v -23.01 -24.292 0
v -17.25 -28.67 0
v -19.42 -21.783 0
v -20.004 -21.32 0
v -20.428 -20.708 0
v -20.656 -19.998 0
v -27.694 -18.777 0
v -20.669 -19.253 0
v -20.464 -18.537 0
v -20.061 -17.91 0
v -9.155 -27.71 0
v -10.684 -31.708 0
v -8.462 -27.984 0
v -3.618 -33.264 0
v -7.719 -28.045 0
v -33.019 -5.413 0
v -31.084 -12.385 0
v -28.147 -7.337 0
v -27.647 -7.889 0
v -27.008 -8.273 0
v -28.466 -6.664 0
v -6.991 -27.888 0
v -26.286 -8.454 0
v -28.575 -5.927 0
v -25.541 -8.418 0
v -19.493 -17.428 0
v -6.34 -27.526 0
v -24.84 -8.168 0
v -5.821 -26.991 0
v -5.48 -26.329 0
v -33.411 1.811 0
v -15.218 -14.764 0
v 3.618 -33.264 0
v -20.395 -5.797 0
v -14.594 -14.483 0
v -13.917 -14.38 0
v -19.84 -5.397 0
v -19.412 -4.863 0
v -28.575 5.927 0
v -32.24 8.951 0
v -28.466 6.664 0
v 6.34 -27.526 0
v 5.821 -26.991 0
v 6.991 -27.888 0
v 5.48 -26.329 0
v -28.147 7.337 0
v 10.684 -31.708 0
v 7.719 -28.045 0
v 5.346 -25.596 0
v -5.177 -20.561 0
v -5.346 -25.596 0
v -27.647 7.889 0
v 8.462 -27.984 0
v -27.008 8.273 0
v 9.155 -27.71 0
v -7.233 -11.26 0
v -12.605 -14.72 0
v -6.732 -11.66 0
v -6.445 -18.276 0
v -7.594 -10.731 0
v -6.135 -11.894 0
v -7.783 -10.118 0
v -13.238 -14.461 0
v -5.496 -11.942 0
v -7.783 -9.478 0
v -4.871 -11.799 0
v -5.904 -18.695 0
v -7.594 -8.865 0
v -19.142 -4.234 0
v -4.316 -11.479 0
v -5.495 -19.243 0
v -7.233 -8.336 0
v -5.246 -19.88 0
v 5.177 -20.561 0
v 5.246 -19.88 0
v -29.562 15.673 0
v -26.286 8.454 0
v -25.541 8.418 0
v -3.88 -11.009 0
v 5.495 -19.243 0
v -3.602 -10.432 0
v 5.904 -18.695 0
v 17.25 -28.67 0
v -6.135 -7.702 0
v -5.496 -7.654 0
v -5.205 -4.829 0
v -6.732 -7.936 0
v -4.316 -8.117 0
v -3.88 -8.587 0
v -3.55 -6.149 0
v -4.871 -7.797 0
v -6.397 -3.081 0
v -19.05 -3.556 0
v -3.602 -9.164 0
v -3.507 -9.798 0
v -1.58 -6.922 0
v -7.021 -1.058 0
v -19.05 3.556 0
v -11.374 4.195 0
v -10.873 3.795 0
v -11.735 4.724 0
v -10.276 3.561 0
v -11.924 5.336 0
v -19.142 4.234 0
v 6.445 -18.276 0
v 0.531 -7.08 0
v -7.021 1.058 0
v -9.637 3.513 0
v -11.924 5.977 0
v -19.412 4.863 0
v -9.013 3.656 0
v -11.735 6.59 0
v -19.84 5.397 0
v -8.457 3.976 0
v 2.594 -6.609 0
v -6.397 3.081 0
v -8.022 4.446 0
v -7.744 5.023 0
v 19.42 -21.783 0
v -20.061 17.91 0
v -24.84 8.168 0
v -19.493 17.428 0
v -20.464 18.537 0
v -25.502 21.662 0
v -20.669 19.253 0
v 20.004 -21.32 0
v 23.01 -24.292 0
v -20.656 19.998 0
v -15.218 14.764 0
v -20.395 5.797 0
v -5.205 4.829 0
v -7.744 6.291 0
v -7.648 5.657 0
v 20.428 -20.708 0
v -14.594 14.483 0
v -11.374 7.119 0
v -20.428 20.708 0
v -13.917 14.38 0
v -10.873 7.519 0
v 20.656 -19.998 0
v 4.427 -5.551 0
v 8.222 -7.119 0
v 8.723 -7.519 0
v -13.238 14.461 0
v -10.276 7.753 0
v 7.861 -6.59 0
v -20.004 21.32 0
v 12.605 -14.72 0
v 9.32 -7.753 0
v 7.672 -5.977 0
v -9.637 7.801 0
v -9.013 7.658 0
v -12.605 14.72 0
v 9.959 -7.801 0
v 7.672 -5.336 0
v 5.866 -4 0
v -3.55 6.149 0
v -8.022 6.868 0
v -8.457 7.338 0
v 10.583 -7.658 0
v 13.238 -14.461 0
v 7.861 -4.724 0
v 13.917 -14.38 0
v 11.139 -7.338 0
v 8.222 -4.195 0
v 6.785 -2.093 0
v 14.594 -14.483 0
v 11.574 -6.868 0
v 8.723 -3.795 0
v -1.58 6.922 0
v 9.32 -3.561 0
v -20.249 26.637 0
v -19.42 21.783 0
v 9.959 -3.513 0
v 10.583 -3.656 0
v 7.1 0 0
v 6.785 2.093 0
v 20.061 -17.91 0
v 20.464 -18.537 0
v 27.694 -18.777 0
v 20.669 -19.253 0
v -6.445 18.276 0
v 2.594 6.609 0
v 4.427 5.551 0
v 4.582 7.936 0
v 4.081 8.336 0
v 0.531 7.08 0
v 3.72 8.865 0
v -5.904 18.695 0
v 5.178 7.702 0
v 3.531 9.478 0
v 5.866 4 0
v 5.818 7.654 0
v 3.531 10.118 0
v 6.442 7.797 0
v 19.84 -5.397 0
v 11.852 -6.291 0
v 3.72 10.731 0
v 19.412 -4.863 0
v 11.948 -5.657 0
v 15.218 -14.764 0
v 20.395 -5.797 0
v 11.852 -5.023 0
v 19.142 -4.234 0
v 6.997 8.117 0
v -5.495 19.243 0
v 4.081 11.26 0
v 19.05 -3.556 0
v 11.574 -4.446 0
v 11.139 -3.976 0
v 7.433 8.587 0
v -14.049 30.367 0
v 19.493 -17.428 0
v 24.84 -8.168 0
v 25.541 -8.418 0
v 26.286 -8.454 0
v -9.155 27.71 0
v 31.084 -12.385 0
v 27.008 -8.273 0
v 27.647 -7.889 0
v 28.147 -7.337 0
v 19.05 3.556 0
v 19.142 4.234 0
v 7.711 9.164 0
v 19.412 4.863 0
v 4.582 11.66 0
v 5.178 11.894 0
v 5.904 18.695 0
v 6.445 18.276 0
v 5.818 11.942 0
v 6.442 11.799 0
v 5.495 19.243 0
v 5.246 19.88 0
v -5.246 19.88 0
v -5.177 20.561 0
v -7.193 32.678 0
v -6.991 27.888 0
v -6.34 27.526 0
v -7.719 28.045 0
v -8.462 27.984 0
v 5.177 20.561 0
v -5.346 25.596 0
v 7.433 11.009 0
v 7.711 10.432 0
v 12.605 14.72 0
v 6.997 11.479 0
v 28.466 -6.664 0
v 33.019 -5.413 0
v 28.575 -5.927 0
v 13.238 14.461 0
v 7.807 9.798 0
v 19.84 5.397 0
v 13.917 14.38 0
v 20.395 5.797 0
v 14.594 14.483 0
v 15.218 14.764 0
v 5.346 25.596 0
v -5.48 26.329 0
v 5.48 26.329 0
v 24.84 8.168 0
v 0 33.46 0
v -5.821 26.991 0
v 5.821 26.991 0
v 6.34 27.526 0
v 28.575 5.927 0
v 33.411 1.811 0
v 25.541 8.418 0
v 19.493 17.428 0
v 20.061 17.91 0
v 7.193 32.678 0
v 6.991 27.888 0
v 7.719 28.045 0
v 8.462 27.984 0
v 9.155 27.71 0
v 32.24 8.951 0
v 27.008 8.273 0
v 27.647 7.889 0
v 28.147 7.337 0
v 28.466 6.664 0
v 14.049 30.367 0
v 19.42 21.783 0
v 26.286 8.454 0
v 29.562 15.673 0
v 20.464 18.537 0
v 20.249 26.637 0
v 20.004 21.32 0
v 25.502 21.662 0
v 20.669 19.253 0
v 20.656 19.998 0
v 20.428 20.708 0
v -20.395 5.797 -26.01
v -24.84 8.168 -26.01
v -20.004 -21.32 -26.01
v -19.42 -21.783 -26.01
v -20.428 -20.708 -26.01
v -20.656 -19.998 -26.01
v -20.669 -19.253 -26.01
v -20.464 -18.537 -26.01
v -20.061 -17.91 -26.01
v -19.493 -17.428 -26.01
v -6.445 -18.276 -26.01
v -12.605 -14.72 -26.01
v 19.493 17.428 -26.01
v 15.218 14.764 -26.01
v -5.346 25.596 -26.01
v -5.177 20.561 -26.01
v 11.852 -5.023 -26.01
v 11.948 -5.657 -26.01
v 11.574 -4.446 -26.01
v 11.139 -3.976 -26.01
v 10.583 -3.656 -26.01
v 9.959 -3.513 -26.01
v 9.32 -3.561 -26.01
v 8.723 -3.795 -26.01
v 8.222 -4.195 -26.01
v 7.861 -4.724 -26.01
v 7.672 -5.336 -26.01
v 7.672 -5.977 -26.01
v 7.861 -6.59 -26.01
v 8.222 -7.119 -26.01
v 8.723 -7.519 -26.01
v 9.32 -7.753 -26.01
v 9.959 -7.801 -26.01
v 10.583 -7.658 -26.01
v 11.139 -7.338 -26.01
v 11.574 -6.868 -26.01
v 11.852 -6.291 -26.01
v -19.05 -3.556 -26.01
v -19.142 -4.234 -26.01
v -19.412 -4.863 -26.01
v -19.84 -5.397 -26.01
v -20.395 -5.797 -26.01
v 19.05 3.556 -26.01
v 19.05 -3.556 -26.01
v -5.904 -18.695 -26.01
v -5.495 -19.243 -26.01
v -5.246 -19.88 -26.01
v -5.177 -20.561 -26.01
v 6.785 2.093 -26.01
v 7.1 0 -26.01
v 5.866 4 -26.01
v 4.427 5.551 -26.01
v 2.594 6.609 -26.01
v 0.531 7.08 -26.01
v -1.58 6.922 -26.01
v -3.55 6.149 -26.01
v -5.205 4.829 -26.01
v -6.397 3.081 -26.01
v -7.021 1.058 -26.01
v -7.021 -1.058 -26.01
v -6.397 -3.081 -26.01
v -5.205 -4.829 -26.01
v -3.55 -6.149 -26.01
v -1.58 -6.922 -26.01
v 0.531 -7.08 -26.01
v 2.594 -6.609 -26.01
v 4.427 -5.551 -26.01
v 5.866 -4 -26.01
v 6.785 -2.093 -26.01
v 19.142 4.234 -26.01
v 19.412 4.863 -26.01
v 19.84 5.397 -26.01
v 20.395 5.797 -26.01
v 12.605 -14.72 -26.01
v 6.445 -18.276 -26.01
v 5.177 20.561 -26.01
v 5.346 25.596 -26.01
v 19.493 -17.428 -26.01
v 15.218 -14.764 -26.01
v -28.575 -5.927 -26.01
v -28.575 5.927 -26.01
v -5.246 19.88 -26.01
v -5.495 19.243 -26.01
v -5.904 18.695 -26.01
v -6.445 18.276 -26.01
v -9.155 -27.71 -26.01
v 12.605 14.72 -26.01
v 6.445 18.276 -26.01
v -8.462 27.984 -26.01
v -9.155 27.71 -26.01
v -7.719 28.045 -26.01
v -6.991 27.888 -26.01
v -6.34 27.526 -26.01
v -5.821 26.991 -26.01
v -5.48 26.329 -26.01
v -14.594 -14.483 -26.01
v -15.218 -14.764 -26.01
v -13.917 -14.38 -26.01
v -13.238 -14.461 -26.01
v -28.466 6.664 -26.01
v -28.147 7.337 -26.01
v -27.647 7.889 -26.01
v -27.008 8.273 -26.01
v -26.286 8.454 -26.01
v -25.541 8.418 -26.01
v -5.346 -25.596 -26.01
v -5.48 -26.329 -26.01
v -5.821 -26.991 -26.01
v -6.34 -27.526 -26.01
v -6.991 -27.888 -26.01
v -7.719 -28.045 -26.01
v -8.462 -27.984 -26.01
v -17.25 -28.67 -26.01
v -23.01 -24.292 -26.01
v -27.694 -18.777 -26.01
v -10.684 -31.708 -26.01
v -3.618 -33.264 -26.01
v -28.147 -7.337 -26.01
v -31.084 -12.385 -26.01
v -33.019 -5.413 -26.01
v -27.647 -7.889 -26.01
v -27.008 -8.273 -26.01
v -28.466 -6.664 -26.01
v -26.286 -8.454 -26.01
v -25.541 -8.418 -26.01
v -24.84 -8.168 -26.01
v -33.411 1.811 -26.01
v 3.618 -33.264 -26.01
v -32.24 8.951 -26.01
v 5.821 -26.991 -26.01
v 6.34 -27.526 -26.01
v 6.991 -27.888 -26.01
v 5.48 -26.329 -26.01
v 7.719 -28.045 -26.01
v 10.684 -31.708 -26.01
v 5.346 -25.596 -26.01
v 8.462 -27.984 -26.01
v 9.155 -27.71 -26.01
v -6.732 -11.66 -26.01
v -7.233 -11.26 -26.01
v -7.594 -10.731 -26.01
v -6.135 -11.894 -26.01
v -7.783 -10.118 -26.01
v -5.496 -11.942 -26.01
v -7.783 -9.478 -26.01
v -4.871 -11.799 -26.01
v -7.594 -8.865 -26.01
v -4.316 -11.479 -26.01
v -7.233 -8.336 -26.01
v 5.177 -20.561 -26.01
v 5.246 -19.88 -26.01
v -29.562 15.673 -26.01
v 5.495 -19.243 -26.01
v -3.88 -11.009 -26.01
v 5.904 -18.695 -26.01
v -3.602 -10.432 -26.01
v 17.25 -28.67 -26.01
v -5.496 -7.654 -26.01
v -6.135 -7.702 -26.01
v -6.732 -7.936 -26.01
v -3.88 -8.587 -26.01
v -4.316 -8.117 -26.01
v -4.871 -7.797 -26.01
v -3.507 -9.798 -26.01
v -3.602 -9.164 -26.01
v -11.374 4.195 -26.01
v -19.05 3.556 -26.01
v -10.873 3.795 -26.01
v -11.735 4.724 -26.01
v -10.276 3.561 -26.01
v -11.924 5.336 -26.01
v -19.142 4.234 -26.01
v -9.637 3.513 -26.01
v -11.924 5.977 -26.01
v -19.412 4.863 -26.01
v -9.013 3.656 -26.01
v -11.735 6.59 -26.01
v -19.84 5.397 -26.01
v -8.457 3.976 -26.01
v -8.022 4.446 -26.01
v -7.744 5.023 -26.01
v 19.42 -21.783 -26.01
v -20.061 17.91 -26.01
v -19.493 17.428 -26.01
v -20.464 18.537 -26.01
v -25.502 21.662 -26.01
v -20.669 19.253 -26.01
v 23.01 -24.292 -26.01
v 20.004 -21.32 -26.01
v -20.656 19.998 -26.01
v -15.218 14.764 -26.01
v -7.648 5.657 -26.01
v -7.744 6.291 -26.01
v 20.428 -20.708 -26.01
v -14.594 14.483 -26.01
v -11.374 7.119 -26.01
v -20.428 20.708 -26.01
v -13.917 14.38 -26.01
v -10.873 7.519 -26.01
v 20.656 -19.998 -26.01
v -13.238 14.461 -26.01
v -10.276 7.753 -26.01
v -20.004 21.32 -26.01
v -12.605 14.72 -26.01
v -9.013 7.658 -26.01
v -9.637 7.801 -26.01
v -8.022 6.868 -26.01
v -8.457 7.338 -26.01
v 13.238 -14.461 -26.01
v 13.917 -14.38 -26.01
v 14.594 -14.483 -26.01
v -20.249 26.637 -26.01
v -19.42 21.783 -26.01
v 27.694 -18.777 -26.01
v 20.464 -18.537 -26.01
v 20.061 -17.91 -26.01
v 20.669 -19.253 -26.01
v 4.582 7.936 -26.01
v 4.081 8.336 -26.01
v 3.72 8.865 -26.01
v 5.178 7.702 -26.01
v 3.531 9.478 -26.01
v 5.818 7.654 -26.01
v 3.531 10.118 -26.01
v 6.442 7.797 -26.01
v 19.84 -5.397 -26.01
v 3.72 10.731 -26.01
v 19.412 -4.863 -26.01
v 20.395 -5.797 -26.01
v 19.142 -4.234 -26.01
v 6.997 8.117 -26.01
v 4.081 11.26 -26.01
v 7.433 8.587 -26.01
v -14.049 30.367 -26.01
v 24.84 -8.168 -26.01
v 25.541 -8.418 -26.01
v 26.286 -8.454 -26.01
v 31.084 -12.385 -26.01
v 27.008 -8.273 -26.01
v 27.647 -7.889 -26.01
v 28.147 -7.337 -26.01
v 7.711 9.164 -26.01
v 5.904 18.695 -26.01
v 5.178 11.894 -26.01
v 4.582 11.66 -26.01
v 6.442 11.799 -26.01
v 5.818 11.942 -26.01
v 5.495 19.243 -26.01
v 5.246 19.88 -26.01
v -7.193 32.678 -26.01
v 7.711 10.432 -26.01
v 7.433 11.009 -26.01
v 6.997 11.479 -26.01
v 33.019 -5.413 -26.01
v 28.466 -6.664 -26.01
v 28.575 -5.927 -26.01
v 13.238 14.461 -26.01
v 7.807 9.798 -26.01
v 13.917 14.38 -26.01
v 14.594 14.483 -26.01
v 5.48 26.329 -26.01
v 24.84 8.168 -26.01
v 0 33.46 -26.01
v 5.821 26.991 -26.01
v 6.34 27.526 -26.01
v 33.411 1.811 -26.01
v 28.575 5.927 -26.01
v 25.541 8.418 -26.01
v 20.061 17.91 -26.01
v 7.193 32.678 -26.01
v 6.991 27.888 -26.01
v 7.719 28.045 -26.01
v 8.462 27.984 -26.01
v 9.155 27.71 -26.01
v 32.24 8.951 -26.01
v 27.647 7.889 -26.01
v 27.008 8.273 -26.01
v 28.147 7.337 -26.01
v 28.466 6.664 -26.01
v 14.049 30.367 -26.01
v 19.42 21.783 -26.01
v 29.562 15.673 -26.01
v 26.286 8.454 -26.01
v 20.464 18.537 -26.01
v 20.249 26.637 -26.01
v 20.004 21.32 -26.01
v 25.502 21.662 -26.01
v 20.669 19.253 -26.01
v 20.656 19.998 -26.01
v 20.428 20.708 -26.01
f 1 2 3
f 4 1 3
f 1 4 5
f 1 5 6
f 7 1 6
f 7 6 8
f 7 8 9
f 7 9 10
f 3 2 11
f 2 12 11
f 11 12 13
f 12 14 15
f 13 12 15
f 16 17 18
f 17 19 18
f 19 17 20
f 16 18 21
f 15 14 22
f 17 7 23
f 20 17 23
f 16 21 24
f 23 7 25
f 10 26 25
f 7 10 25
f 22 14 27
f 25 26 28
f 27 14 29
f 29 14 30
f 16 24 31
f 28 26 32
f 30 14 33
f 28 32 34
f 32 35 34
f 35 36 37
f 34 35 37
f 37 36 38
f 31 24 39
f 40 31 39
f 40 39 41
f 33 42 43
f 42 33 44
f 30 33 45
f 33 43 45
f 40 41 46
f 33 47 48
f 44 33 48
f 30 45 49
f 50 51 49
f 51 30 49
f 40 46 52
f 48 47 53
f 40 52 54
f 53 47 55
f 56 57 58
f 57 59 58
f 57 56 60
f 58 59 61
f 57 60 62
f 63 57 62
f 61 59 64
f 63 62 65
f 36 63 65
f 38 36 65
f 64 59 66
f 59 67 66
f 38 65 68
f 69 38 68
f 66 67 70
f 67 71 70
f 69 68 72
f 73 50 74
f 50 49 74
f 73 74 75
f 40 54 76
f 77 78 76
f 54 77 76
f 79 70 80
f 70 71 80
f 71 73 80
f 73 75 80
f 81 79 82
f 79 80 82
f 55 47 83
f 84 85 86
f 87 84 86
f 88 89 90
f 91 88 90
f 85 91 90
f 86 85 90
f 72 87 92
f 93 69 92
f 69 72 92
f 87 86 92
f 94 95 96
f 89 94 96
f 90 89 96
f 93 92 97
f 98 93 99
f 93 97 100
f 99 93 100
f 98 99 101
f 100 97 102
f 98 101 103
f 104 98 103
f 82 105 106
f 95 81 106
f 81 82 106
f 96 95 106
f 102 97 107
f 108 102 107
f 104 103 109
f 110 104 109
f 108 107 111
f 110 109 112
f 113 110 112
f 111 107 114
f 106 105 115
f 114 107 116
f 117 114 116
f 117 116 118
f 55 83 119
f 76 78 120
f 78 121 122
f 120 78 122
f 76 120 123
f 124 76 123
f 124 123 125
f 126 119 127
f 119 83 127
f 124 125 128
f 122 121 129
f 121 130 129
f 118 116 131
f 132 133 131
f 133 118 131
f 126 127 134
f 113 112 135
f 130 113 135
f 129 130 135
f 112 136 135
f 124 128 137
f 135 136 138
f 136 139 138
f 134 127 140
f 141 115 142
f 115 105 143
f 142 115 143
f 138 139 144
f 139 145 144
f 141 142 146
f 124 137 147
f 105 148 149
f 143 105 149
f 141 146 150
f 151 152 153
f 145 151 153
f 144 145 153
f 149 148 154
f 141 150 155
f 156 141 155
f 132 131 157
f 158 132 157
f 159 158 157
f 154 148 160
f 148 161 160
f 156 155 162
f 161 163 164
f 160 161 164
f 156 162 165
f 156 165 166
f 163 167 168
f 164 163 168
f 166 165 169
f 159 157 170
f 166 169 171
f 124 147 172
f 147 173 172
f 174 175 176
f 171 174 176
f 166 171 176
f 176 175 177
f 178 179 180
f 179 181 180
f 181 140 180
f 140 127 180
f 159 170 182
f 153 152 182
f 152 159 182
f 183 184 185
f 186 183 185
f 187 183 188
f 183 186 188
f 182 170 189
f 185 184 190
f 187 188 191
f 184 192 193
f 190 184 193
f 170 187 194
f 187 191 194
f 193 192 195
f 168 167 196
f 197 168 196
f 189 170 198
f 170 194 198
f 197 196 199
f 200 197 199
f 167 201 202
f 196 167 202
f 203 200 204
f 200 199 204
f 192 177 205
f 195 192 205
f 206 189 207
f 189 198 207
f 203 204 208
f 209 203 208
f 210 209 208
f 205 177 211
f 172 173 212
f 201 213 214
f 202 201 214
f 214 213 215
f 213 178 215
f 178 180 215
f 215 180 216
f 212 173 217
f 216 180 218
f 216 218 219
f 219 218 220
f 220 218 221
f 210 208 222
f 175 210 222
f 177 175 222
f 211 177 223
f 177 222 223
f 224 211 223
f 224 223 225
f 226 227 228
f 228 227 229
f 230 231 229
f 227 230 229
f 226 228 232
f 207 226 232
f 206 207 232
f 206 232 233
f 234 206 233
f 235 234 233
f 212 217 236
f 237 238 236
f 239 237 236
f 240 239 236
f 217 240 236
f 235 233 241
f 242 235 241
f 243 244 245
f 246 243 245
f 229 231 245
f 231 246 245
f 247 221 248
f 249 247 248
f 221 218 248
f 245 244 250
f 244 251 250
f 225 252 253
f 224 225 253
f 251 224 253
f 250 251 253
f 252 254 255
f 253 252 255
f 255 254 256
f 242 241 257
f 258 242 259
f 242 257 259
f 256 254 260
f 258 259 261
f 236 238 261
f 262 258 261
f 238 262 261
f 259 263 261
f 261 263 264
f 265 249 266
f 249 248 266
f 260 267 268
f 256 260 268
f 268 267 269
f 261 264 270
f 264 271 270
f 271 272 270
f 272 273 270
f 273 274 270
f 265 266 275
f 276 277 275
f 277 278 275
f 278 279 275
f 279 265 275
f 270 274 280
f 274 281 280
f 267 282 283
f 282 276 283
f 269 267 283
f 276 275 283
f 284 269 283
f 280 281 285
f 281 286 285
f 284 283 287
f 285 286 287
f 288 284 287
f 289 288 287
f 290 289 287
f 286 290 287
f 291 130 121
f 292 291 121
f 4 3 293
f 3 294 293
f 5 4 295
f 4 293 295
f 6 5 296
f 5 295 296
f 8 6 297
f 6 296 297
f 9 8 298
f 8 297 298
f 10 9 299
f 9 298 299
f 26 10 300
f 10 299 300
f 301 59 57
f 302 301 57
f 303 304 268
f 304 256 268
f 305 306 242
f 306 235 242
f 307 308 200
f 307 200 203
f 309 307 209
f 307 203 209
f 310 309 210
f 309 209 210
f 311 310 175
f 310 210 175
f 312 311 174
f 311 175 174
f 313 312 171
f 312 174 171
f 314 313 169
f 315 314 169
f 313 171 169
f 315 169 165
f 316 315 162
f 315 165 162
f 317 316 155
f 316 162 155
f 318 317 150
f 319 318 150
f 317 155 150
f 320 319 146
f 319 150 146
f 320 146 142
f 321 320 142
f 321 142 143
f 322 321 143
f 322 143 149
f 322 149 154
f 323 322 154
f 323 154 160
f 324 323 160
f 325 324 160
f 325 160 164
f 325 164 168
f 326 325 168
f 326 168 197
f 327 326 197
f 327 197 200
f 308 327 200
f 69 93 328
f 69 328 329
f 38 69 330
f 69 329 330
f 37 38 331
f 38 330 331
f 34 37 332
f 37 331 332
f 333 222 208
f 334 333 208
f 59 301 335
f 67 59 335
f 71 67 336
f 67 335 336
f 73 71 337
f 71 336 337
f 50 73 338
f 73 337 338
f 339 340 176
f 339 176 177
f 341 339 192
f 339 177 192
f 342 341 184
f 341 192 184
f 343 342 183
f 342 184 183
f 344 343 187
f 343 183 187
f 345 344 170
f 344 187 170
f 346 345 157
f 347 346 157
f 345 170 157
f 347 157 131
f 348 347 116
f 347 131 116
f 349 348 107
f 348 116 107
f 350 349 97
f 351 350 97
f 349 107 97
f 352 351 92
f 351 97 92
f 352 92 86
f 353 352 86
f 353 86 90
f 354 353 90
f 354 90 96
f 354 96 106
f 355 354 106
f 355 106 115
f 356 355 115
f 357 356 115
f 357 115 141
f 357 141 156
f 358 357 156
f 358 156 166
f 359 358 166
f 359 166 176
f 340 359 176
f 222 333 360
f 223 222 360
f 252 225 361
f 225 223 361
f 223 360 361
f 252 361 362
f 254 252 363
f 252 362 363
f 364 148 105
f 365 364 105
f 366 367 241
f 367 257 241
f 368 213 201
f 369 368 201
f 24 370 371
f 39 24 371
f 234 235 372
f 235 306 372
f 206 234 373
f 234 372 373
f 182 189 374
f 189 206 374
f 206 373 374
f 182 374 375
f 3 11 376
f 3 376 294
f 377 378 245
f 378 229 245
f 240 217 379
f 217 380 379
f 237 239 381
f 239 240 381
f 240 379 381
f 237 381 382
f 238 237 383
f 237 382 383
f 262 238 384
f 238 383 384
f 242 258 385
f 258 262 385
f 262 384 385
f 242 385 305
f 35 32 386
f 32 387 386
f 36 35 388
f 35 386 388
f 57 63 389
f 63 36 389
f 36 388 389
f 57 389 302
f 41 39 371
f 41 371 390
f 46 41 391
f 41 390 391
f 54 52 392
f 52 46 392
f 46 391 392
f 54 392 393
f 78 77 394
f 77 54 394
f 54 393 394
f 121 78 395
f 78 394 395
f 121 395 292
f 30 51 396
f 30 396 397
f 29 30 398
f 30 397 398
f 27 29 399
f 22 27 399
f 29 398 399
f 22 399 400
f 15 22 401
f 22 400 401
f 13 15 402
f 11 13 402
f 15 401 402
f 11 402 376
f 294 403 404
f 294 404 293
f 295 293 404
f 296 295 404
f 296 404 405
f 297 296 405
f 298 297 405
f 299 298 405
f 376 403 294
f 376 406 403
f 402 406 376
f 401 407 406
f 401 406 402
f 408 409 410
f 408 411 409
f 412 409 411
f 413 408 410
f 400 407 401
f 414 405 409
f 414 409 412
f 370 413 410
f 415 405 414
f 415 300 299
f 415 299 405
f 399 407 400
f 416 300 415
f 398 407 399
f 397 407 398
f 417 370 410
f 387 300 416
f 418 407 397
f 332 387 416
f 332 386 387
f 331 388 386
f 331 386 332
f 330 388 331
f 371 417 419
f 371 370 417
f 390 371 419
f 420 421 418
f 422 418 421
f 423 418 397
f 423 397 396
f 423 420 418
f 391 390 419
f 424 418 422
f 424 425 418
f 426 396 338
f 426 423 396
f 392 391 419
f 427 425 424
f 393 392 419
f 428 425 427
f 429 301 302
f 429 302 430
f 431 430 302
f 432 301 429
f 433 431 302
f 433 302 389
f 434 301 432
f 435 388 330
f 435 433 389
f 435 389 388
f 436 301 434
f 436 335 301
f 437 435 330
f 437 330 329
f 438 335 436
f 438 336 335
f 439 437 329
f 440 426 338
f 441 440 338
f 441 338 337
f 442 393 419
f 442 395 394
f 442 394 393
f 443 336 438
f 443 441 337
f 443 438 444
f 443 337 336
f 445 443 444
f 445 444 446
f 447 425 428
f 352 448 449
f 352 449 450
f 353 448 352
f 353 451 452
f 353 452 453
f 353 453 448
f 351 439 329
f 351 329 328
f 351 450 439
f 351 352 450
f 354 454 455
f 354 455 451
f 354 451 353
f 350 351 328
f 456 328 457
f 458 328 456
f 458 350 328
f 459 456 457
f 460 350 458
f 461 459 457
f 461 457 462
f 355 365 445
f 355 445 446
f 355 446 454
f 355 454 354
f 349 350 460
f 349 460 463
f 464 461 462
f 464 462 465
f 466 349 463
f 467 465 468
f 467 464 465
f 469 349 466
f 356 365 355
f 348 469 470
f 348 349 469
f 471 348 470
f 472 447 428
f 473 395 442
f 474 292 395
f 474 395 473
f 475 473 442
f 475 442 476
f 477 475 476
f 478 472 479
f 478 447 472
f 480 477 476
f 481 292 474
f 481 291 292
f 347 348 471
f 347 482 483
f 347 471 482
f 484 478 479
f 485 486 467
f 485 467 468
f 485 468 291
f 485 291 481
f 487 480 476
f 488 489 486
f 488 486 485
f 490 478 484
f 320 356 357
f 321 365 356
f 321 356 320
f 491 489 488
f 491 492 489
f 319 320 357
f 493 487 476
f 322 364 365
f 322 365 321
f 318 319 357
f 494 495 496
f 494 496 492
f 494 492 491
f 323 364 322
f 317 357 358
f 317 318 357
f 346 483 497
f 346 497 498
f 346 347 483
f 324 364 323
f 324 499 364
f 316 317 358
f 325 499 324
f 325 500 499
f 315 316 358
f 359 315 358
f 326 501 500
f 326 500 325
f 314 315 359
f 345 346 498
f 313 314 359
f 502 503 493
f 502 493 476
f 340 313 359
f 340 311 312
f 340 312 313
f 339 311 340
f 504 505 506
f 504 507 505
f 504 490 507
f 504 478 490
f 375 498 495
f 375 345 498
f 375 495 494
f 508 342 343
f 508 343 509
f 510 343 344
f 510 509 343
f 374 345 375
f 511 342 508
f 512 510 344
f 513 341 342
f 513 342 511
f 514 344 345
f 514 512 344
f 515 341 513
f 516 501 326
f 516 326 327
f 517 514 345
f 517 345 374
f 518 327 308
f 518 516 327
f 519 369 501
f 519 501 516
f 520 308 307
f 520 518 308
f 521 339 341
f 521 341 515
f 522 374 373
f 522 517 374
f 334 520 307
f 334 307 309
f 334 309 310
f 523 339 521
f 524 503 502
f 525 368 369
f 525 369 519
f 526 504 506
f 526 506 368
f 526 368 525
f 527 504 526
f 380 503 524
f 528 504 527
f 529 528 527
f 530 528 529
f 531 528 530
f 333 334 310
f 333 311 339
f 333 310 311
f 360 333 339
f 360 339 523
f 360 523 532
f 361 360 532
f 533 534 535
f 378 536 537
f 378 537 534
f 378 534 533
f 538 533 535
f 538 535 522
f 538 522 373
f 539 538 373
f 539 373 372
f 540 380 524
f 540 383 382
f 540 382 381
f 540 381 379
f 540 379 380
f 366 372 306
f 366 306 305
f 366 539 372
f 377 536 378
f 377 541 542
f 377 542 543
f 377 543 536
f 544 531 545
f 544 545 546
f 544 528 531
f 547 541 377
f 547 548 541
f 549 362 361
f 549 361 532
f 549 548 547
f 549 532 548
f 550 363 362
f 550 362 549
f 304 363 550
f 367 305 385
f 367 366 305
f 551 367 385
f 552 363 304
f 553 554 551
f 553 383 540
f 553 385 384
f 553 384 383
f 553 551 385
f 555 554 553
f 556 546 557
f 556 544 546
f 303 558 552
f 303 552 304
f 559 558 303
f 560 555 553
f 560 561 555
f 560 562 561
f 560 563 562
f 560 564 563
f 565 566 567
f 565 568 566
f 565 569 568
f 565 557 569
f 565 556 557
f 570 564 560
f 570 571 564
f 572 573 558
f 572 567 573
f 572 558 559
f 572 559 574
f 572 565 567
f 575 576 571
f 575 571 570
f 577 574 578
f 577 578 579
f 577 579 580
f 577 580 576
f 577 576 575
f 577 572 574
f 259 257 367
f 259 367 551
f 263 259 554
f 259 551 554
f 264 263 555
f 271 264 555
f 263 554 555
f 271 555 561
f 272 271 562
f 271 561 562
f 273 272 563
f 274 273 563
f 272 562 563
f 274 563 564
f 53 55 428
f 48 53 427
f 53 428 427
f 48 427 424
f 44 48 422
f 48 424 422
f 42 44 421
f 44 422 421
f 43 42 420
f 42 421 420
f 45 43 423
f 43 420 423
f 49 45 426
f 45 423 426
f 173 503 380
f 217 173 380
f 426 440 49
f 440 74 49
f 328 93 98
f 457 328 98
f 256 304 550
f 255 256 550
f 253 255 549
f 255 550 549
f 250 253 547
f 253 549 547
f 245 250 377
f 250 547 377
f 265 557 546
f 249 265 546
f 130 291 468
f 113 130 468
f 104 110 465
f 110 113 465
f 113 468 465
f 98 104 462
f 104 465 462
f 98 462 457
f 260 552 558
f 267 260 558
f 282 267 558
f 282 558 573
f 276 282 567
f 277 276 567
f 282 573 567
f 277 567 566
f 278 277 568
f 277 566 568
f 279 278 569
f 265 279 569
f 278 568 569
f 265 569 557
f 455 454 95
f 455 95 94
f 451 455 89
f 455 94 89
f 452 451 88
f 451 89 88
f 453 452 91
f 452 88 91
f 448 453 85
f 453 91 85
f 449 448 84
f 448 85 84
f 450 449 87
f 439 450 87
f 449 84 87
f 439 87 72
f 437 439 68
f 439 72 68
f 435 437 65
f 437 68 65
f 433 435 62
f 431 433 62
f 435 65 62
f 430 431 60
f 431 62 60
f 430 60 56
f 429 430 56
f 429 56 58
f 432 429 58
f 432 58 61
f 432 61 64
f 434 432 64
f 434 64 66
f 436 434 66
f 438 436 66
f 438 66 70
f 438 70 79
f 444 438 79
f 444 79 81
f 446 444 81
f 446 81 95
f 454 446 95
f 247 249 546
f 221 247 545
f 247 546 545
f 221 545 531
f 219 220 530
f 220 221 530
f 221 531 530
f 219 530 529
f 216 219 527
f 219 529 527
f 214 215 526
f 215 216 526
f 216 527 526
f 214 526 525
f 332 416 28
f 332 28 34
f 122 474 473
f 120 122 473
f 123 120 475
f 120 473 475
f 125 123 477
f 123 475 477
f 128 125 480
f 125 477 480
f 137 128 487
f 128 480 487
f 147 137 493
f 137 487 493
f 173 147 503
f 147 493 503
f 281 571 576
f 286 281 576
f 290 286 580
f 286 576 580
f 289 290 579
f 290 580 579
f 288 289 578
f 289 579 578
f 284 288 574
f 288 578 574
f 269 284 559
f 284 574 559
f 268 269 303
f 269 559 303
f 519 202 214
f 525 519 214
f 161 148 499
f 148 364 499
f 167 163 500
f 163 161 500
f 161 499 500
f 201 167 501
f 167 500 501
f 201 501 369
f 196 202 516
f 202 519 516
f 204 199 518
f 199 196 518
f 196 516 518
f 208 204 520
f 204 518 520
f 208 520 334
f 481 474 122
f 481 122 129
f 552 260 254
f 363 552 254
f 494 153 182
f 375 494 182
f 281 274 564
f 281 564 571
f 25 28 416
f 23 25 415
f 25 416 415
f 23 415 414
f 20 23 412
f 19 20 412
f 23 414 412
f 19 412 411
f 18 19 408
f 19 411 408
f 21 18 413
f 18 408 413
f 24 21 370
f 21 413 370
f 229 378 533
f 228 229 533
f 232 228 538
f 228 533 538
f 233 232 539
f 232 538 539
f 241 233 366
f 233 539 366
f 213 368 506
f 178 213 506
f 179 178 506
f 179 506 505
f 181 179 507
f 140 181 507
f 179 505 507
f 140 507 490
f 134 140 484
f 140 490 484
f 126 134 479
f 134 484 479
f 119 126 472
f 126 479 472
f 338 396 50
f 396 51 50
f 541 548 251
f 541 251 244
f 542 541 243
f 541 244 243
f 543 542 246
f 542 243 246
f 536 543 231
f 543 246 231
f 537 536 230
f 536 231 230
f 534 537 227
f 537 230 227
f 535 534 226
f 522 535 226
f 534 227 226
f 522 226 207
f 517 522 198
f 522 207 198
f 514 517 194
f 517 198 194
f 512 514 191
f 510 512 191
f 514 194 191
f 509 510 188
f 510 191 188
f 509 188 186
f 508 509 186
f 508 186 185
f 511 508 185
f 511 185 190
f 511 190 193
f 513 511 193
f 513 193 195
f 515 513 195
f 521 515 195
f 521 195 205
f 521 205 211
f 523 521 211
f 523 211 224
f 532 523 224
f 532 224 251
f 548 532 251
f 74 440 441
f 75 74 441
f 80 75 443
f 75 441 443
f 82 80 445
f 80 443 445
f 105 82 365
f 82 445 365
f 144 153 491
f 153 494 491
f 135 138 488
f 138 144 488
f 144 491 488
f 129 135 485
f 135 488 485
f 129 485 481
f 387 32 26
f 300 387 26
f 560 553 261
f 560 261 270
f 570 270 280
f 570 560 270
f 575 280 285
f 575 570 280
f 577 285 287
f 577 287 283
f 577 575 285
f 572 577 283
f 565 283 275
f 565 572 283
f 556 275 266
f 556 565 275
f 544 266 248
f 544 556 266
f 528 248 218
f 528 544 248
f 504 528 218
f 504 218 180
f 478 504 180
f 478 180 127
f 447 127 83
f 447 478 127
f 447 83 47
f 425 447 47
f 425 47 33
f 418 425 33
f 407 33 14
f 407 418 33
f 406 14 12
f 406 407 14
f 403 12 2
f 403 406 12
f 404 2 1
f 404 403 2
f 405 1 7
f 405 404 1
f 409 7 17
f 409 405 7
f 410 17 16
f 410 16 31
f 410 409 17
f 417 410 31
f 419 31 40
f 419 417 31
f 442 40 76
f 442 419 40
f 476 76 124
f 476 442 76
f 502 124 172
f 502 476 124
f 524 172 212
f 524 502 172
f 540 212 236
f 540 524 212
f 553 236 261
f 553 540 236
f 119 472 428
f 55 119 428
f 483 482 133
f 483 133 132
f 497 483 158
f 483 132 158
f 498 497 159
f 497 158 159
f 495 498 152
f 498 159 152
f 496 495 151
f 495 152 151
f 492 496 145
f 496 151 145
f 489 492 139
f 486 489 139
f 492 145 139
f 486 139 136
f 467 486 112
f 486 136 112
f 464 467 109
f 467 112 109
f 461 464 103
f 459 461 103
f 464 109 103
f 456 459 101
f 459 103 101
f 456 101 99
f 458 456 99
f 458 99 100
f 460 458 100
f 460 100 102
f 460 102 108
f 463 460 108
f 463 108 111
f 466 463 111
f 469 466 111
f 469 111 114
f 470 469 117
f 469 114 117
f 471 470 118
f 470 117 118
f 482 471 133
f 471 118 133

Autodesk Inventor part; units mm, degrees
ref_plane "YZ Plane" through (0, 0, 0) normal (1, 0, 0) x (0, 1, 0)
ref_plane "XZ Plane" through (0, 0, 0) normal (0, 1, 0) x (-1, 0, 0)
ref_plane "XY Plane" through (0, 0, 0) normal (0, 0, 1) x (1, 0, 0)
sketch "Sketch4" plane through (0, 0, 0) normal (1, 0, 0) x (0, 1, 0)
  line L0 (0, 0) -> (0, -26.0096)
  line L1 (0, 0) -> (33.46, 0)
  line L2 (33.46, 0) -> (33.46, -26.0096)
  line L3 (33.46, -26.0096) -> (0, -26.0096)
  line L4 (35.286, -25.908) -> (35.1766, -0.1801)
  arc A0 (35.286, -25.908) -> (35.2799, -24.4856) centre (35.283, -25.1968) ccw
  arc A1 (35.2795, -24.384) -> (35.2735, -22.9616) centre (35.2765, -23.6728) ccw
  arc A2 (35.273, -22.86) -> (35.267, -21.4376) centre (35.27, -22.1488) ccw
  arc A3 (35.2665, -21.336) -> (35.2605, -19.9137) centre (35.2635, -20.6248) ccw
  arc A4 (35.2601, -19.8121) -> (35.254, -18.3897) centre (35.257, -19.1009) ccw
  arc A5 (35.2536, -18.2881) -> (35.2475, -16.8657) centre (35.2506, -17.5769) ccw
  arc A6 (35.2471, -16.7641) -> (35.2411, -15.3417) centre (35.2441, -16.0529) ccw
  arc A7 (35.2406, -15.2401) -> (35.2346, -13.8177) centre (35.2376, -14.5289) ccw
  arc A8 (35.2342, -13.7161) -> (35.2281, -12.2937) centre (35.2311, -13.0049) ccw
  arc A9 (35.2277, -12.1921) -> (35.2216, -10.7697) centre (35.2247, -11.4809) ccw
  arc A10 (35.2212, -10.6681) -> (35.2152, -9.2458) centre (35.2182, -9.9569) ccw
  arc A11 (35.2147, -9.1442) -> (35.2087, -7.7218) centre (35.2117, -8.433) ccw
  arc A12 (35.2083, -7.6202) -> (35.2022, -6.1978) centre (35.2052, -6.909) ccw
  arc A13 (35.2018, -6.0962) -> (35.1957, -4.6738) centre (35.1988, -5.385) ccw
  arc A14 (35.1953, -4.5722) -> (35.1893, -3.1498) centre (35.1923, -3.861) ccw
  arc A15 (35.1888, -3.0482) -> (35.1828, -1.6258) centre (35.1858, -2.337) ccw
  arc A16 (35.1824, -1.5242) -> (35.1763, -0.1018) centre (35.1793, -0.813) ccw
  line L5 (35.1763, -0.1018) -> (33.46, -0.1018)
  line L6 (35.286, -25.908) -> (33.46, -25.908)
  point P0 (35.2799, -24.4856)
  point P1 (35.2735, -22.9616)
  point P2 (35.267, -21.4376)
  point P3 (35.2605, -19.9137)
  point P4 (35.254, -18.3897)
  point P5 (35.2536, -18.2881)
  point P6 (35.2475, -16.8657)
  point P7 (35.2411, -15.3417)
  point P8 (35.2406, -15.2401)
  point P9 (35.2346, -13.8177)
  point P10 (35.2342, -13.7161)
  point P11 (35.2281, -12.2937)
  point P12 (35.2277, -12.1921)
  point P13 (35.2216, -10.7697)
  point P14 (35.2152, -9.2458)
  point P15 (35.2087, -7.7218)
  point P16 (35.2083, -7.6202)
  point P17 (35.2022, -6.1978)
  point P18 (35.2018, -6.0962)
  point P19 (35.1957, -4.6738)
  point P20 (35.1953, -4.5722)
  point P21 (35.1893, -3.1498)
  point P22 (35.1888, -3.0482)
  point P23 (35.1828, -1.6258)
  point P24 (35.1824, -1.5242)
  dimension "d12" = 26.0096
  dimension "d13" = 33.46
  dimension "d14" = 1.8288
  dimension "d18" = 1.524
  dimension "d25" = 0.7112
  dimension "d26" = 0.243
  dimension "d27" = 0.1016
  dimension "d28" = 0
revolve "Revolution1" add sketch "Sketch4" angle 360 about axis through (0, 0, 0) along (0, 0, -1) contours L1 L2 L3 L0
sketch "Sketch5" plane through (0, 0, 0) normal (0, 0, 1) x (1, 0, 0)
  line L0 (19.05, 5.08) -> (19.05, -5.08)
  line L1 (28.575, 10.16) -> (28.575, -10.16)
  line L2 (28.575, 10.16) -> (19.05, 5.08)
  line L3 (19.05, -5.08) -> (28.575, -10.16)
  line L4 (5.4887, 29.8267) -> (5.1256, 19.0378)
  line L5 (5.4887, 29.8267) -> (23.0863, 19.6667)
  line L6 (5.1256, 19.0378) -> (13.9244, 13.9578)
  line L7 (13.9244, 13.9578) -> (23.0863, 19.6667)
  line L8 (-23.0863, 19.6667) -> (-13.9244, 13.9578)
  line L9 (-23.0863, 19.6667) -> (-5.4887, 29.8267)
  line L10 (-13.9244, 13.9578) -> (-5.1256, 19.0378)
  line L11 (-5.1256, 19.0378) -> (-5.4887, 29.8267)
  line L12 (-28.575, -10.16) -> (-19.05, -5.08)
  line L13 (-28.575, -10.16) -> (-28.575, 10.16)
  line L14 (-19.05, -5.08) -> (-19.05, 5.08)
  line L15 (-19.05, 5.08) -> (-28.575, 10.16)
  line L16 (-5.4887, -29.8267) -> (-5.1256, -19.0378)
  line L17 (-5.4887, -29.8267) -> (-23.0863, -19.6667)
  line L18 (-5.1256, -19.0378) -> (-13.9244, -13.9578)
  line L19 (-13.9244, -13.9578) -> (-23.0863, -19.6667)
  line L20 (23.0863, -19.6667) -> (13.9244, -13.9578)
  line L21 (23.0863, -19.6667) -> (5.4887, -29.8267)
  line L22 (13.9244, -13.9578) -> (5.1256, -19.0378)
  line L23 (5.1256, -19.0378) -> (5.4887, -29.8267)
  point P0 (0, 0)
  point P1 (19.05, 0)
  point P2 (28.575, 0)
  point P3 (14.2875, 24.7467)
  point P4 (9.525, 16.4978)
  point P5 (-14.2875, 24.7467)
  point P6 (-9.525, 16.4978)
  point P7 (-28.575, 0)
  point P8 (-19.05, 0)
  point P9 (-14.2875, -24.7467)
  point P10 (-9.525, -16.4978)
  point P11 (14.2875, -24.7467)
  point P12 (9.525, -16.4978)
  dimension "d30" = 10.16
  dimension "d31" = 20.32
  dimension "d32" = 0
  dimension "d33" = 19.05
  dimension "d34" = 9.525
  dimension "d35" = 0
  dimension "d38" = 360
extrude "Extrusion3" cut sketch "Sketch5" against normal through all
fillet "Fillet1" radius 2.54 24 edges at (-5.4887, -29.8267, -13.0048) (-5.1256, -19.0378, -13.0048) (-13.9244, -13.9578, -13.0048) (-23.0863, -19.6667, -13.0048) (5.4887, 29.8267, -13.0048) (5.1256, 19.0378, -13.0048) (13.9244, 13.9578, -13.0048) (23.0863, 19.6667, -13.0048) (-28.575, -10.16, -13.0048) (-19.05, -5.08, -13.0048) (-19.05, 5.08, -13.0048) (-28.575, 10.16, -13.0048) (23.0863, -19.6667, -13.0048) (13.9244, -13.9578, -13.0048) (5.1256, -19.0378, -13.0048) (5.4887, -29.8267, -13.0048) (28.575, 10.16, -13.0048) (19.05, 5.08, -13.0048) (19.05, -5.08, -13.0048) (28.575, -10.16, -13.0048) (-23.0863, 19.6667, -13.0048) (-13.9244, 13.9578, -13.0048) (-5.1256, 19.0378, -13.0048) (-5.4887, 29.8267, -13.0048)
sketch "Sketch6" plane through (0, 0, 0) normal (0, 0, 1) x (1, 0, 0)
  circle A0 centre (0, 0) radius 7.1
  circle A1 centre (-9.798, 5.6569) radius 2 construction
  circle A2 centre (5.6569, 9.798) radius 2 construction
  circle A3 centre (9.798, -5.6569) radius 2 construction
  circle A4 centre (-5.6569, -9.798) radius 2 construction
  circle A5 centre (-9.798, 5.6569) radius 2.15
  circle A6 centre (5.6569, 9.798) radius 2.15
  circle A7 centre (9.798, -5.6569) radius 2.15
  circle A8 centre (-5.6569, -9.798) radius 2.15
  dimension "d43" = 14.2
  dimension "d46" = 4.3
  dimension "d47" = 4.3
  dimension "d48" = 4.3
  dimension "d49" = 4.3
extrude "Extrusion4" cut sketch "Sketch6" against normal through all
properties part number "Wheel_Base"
